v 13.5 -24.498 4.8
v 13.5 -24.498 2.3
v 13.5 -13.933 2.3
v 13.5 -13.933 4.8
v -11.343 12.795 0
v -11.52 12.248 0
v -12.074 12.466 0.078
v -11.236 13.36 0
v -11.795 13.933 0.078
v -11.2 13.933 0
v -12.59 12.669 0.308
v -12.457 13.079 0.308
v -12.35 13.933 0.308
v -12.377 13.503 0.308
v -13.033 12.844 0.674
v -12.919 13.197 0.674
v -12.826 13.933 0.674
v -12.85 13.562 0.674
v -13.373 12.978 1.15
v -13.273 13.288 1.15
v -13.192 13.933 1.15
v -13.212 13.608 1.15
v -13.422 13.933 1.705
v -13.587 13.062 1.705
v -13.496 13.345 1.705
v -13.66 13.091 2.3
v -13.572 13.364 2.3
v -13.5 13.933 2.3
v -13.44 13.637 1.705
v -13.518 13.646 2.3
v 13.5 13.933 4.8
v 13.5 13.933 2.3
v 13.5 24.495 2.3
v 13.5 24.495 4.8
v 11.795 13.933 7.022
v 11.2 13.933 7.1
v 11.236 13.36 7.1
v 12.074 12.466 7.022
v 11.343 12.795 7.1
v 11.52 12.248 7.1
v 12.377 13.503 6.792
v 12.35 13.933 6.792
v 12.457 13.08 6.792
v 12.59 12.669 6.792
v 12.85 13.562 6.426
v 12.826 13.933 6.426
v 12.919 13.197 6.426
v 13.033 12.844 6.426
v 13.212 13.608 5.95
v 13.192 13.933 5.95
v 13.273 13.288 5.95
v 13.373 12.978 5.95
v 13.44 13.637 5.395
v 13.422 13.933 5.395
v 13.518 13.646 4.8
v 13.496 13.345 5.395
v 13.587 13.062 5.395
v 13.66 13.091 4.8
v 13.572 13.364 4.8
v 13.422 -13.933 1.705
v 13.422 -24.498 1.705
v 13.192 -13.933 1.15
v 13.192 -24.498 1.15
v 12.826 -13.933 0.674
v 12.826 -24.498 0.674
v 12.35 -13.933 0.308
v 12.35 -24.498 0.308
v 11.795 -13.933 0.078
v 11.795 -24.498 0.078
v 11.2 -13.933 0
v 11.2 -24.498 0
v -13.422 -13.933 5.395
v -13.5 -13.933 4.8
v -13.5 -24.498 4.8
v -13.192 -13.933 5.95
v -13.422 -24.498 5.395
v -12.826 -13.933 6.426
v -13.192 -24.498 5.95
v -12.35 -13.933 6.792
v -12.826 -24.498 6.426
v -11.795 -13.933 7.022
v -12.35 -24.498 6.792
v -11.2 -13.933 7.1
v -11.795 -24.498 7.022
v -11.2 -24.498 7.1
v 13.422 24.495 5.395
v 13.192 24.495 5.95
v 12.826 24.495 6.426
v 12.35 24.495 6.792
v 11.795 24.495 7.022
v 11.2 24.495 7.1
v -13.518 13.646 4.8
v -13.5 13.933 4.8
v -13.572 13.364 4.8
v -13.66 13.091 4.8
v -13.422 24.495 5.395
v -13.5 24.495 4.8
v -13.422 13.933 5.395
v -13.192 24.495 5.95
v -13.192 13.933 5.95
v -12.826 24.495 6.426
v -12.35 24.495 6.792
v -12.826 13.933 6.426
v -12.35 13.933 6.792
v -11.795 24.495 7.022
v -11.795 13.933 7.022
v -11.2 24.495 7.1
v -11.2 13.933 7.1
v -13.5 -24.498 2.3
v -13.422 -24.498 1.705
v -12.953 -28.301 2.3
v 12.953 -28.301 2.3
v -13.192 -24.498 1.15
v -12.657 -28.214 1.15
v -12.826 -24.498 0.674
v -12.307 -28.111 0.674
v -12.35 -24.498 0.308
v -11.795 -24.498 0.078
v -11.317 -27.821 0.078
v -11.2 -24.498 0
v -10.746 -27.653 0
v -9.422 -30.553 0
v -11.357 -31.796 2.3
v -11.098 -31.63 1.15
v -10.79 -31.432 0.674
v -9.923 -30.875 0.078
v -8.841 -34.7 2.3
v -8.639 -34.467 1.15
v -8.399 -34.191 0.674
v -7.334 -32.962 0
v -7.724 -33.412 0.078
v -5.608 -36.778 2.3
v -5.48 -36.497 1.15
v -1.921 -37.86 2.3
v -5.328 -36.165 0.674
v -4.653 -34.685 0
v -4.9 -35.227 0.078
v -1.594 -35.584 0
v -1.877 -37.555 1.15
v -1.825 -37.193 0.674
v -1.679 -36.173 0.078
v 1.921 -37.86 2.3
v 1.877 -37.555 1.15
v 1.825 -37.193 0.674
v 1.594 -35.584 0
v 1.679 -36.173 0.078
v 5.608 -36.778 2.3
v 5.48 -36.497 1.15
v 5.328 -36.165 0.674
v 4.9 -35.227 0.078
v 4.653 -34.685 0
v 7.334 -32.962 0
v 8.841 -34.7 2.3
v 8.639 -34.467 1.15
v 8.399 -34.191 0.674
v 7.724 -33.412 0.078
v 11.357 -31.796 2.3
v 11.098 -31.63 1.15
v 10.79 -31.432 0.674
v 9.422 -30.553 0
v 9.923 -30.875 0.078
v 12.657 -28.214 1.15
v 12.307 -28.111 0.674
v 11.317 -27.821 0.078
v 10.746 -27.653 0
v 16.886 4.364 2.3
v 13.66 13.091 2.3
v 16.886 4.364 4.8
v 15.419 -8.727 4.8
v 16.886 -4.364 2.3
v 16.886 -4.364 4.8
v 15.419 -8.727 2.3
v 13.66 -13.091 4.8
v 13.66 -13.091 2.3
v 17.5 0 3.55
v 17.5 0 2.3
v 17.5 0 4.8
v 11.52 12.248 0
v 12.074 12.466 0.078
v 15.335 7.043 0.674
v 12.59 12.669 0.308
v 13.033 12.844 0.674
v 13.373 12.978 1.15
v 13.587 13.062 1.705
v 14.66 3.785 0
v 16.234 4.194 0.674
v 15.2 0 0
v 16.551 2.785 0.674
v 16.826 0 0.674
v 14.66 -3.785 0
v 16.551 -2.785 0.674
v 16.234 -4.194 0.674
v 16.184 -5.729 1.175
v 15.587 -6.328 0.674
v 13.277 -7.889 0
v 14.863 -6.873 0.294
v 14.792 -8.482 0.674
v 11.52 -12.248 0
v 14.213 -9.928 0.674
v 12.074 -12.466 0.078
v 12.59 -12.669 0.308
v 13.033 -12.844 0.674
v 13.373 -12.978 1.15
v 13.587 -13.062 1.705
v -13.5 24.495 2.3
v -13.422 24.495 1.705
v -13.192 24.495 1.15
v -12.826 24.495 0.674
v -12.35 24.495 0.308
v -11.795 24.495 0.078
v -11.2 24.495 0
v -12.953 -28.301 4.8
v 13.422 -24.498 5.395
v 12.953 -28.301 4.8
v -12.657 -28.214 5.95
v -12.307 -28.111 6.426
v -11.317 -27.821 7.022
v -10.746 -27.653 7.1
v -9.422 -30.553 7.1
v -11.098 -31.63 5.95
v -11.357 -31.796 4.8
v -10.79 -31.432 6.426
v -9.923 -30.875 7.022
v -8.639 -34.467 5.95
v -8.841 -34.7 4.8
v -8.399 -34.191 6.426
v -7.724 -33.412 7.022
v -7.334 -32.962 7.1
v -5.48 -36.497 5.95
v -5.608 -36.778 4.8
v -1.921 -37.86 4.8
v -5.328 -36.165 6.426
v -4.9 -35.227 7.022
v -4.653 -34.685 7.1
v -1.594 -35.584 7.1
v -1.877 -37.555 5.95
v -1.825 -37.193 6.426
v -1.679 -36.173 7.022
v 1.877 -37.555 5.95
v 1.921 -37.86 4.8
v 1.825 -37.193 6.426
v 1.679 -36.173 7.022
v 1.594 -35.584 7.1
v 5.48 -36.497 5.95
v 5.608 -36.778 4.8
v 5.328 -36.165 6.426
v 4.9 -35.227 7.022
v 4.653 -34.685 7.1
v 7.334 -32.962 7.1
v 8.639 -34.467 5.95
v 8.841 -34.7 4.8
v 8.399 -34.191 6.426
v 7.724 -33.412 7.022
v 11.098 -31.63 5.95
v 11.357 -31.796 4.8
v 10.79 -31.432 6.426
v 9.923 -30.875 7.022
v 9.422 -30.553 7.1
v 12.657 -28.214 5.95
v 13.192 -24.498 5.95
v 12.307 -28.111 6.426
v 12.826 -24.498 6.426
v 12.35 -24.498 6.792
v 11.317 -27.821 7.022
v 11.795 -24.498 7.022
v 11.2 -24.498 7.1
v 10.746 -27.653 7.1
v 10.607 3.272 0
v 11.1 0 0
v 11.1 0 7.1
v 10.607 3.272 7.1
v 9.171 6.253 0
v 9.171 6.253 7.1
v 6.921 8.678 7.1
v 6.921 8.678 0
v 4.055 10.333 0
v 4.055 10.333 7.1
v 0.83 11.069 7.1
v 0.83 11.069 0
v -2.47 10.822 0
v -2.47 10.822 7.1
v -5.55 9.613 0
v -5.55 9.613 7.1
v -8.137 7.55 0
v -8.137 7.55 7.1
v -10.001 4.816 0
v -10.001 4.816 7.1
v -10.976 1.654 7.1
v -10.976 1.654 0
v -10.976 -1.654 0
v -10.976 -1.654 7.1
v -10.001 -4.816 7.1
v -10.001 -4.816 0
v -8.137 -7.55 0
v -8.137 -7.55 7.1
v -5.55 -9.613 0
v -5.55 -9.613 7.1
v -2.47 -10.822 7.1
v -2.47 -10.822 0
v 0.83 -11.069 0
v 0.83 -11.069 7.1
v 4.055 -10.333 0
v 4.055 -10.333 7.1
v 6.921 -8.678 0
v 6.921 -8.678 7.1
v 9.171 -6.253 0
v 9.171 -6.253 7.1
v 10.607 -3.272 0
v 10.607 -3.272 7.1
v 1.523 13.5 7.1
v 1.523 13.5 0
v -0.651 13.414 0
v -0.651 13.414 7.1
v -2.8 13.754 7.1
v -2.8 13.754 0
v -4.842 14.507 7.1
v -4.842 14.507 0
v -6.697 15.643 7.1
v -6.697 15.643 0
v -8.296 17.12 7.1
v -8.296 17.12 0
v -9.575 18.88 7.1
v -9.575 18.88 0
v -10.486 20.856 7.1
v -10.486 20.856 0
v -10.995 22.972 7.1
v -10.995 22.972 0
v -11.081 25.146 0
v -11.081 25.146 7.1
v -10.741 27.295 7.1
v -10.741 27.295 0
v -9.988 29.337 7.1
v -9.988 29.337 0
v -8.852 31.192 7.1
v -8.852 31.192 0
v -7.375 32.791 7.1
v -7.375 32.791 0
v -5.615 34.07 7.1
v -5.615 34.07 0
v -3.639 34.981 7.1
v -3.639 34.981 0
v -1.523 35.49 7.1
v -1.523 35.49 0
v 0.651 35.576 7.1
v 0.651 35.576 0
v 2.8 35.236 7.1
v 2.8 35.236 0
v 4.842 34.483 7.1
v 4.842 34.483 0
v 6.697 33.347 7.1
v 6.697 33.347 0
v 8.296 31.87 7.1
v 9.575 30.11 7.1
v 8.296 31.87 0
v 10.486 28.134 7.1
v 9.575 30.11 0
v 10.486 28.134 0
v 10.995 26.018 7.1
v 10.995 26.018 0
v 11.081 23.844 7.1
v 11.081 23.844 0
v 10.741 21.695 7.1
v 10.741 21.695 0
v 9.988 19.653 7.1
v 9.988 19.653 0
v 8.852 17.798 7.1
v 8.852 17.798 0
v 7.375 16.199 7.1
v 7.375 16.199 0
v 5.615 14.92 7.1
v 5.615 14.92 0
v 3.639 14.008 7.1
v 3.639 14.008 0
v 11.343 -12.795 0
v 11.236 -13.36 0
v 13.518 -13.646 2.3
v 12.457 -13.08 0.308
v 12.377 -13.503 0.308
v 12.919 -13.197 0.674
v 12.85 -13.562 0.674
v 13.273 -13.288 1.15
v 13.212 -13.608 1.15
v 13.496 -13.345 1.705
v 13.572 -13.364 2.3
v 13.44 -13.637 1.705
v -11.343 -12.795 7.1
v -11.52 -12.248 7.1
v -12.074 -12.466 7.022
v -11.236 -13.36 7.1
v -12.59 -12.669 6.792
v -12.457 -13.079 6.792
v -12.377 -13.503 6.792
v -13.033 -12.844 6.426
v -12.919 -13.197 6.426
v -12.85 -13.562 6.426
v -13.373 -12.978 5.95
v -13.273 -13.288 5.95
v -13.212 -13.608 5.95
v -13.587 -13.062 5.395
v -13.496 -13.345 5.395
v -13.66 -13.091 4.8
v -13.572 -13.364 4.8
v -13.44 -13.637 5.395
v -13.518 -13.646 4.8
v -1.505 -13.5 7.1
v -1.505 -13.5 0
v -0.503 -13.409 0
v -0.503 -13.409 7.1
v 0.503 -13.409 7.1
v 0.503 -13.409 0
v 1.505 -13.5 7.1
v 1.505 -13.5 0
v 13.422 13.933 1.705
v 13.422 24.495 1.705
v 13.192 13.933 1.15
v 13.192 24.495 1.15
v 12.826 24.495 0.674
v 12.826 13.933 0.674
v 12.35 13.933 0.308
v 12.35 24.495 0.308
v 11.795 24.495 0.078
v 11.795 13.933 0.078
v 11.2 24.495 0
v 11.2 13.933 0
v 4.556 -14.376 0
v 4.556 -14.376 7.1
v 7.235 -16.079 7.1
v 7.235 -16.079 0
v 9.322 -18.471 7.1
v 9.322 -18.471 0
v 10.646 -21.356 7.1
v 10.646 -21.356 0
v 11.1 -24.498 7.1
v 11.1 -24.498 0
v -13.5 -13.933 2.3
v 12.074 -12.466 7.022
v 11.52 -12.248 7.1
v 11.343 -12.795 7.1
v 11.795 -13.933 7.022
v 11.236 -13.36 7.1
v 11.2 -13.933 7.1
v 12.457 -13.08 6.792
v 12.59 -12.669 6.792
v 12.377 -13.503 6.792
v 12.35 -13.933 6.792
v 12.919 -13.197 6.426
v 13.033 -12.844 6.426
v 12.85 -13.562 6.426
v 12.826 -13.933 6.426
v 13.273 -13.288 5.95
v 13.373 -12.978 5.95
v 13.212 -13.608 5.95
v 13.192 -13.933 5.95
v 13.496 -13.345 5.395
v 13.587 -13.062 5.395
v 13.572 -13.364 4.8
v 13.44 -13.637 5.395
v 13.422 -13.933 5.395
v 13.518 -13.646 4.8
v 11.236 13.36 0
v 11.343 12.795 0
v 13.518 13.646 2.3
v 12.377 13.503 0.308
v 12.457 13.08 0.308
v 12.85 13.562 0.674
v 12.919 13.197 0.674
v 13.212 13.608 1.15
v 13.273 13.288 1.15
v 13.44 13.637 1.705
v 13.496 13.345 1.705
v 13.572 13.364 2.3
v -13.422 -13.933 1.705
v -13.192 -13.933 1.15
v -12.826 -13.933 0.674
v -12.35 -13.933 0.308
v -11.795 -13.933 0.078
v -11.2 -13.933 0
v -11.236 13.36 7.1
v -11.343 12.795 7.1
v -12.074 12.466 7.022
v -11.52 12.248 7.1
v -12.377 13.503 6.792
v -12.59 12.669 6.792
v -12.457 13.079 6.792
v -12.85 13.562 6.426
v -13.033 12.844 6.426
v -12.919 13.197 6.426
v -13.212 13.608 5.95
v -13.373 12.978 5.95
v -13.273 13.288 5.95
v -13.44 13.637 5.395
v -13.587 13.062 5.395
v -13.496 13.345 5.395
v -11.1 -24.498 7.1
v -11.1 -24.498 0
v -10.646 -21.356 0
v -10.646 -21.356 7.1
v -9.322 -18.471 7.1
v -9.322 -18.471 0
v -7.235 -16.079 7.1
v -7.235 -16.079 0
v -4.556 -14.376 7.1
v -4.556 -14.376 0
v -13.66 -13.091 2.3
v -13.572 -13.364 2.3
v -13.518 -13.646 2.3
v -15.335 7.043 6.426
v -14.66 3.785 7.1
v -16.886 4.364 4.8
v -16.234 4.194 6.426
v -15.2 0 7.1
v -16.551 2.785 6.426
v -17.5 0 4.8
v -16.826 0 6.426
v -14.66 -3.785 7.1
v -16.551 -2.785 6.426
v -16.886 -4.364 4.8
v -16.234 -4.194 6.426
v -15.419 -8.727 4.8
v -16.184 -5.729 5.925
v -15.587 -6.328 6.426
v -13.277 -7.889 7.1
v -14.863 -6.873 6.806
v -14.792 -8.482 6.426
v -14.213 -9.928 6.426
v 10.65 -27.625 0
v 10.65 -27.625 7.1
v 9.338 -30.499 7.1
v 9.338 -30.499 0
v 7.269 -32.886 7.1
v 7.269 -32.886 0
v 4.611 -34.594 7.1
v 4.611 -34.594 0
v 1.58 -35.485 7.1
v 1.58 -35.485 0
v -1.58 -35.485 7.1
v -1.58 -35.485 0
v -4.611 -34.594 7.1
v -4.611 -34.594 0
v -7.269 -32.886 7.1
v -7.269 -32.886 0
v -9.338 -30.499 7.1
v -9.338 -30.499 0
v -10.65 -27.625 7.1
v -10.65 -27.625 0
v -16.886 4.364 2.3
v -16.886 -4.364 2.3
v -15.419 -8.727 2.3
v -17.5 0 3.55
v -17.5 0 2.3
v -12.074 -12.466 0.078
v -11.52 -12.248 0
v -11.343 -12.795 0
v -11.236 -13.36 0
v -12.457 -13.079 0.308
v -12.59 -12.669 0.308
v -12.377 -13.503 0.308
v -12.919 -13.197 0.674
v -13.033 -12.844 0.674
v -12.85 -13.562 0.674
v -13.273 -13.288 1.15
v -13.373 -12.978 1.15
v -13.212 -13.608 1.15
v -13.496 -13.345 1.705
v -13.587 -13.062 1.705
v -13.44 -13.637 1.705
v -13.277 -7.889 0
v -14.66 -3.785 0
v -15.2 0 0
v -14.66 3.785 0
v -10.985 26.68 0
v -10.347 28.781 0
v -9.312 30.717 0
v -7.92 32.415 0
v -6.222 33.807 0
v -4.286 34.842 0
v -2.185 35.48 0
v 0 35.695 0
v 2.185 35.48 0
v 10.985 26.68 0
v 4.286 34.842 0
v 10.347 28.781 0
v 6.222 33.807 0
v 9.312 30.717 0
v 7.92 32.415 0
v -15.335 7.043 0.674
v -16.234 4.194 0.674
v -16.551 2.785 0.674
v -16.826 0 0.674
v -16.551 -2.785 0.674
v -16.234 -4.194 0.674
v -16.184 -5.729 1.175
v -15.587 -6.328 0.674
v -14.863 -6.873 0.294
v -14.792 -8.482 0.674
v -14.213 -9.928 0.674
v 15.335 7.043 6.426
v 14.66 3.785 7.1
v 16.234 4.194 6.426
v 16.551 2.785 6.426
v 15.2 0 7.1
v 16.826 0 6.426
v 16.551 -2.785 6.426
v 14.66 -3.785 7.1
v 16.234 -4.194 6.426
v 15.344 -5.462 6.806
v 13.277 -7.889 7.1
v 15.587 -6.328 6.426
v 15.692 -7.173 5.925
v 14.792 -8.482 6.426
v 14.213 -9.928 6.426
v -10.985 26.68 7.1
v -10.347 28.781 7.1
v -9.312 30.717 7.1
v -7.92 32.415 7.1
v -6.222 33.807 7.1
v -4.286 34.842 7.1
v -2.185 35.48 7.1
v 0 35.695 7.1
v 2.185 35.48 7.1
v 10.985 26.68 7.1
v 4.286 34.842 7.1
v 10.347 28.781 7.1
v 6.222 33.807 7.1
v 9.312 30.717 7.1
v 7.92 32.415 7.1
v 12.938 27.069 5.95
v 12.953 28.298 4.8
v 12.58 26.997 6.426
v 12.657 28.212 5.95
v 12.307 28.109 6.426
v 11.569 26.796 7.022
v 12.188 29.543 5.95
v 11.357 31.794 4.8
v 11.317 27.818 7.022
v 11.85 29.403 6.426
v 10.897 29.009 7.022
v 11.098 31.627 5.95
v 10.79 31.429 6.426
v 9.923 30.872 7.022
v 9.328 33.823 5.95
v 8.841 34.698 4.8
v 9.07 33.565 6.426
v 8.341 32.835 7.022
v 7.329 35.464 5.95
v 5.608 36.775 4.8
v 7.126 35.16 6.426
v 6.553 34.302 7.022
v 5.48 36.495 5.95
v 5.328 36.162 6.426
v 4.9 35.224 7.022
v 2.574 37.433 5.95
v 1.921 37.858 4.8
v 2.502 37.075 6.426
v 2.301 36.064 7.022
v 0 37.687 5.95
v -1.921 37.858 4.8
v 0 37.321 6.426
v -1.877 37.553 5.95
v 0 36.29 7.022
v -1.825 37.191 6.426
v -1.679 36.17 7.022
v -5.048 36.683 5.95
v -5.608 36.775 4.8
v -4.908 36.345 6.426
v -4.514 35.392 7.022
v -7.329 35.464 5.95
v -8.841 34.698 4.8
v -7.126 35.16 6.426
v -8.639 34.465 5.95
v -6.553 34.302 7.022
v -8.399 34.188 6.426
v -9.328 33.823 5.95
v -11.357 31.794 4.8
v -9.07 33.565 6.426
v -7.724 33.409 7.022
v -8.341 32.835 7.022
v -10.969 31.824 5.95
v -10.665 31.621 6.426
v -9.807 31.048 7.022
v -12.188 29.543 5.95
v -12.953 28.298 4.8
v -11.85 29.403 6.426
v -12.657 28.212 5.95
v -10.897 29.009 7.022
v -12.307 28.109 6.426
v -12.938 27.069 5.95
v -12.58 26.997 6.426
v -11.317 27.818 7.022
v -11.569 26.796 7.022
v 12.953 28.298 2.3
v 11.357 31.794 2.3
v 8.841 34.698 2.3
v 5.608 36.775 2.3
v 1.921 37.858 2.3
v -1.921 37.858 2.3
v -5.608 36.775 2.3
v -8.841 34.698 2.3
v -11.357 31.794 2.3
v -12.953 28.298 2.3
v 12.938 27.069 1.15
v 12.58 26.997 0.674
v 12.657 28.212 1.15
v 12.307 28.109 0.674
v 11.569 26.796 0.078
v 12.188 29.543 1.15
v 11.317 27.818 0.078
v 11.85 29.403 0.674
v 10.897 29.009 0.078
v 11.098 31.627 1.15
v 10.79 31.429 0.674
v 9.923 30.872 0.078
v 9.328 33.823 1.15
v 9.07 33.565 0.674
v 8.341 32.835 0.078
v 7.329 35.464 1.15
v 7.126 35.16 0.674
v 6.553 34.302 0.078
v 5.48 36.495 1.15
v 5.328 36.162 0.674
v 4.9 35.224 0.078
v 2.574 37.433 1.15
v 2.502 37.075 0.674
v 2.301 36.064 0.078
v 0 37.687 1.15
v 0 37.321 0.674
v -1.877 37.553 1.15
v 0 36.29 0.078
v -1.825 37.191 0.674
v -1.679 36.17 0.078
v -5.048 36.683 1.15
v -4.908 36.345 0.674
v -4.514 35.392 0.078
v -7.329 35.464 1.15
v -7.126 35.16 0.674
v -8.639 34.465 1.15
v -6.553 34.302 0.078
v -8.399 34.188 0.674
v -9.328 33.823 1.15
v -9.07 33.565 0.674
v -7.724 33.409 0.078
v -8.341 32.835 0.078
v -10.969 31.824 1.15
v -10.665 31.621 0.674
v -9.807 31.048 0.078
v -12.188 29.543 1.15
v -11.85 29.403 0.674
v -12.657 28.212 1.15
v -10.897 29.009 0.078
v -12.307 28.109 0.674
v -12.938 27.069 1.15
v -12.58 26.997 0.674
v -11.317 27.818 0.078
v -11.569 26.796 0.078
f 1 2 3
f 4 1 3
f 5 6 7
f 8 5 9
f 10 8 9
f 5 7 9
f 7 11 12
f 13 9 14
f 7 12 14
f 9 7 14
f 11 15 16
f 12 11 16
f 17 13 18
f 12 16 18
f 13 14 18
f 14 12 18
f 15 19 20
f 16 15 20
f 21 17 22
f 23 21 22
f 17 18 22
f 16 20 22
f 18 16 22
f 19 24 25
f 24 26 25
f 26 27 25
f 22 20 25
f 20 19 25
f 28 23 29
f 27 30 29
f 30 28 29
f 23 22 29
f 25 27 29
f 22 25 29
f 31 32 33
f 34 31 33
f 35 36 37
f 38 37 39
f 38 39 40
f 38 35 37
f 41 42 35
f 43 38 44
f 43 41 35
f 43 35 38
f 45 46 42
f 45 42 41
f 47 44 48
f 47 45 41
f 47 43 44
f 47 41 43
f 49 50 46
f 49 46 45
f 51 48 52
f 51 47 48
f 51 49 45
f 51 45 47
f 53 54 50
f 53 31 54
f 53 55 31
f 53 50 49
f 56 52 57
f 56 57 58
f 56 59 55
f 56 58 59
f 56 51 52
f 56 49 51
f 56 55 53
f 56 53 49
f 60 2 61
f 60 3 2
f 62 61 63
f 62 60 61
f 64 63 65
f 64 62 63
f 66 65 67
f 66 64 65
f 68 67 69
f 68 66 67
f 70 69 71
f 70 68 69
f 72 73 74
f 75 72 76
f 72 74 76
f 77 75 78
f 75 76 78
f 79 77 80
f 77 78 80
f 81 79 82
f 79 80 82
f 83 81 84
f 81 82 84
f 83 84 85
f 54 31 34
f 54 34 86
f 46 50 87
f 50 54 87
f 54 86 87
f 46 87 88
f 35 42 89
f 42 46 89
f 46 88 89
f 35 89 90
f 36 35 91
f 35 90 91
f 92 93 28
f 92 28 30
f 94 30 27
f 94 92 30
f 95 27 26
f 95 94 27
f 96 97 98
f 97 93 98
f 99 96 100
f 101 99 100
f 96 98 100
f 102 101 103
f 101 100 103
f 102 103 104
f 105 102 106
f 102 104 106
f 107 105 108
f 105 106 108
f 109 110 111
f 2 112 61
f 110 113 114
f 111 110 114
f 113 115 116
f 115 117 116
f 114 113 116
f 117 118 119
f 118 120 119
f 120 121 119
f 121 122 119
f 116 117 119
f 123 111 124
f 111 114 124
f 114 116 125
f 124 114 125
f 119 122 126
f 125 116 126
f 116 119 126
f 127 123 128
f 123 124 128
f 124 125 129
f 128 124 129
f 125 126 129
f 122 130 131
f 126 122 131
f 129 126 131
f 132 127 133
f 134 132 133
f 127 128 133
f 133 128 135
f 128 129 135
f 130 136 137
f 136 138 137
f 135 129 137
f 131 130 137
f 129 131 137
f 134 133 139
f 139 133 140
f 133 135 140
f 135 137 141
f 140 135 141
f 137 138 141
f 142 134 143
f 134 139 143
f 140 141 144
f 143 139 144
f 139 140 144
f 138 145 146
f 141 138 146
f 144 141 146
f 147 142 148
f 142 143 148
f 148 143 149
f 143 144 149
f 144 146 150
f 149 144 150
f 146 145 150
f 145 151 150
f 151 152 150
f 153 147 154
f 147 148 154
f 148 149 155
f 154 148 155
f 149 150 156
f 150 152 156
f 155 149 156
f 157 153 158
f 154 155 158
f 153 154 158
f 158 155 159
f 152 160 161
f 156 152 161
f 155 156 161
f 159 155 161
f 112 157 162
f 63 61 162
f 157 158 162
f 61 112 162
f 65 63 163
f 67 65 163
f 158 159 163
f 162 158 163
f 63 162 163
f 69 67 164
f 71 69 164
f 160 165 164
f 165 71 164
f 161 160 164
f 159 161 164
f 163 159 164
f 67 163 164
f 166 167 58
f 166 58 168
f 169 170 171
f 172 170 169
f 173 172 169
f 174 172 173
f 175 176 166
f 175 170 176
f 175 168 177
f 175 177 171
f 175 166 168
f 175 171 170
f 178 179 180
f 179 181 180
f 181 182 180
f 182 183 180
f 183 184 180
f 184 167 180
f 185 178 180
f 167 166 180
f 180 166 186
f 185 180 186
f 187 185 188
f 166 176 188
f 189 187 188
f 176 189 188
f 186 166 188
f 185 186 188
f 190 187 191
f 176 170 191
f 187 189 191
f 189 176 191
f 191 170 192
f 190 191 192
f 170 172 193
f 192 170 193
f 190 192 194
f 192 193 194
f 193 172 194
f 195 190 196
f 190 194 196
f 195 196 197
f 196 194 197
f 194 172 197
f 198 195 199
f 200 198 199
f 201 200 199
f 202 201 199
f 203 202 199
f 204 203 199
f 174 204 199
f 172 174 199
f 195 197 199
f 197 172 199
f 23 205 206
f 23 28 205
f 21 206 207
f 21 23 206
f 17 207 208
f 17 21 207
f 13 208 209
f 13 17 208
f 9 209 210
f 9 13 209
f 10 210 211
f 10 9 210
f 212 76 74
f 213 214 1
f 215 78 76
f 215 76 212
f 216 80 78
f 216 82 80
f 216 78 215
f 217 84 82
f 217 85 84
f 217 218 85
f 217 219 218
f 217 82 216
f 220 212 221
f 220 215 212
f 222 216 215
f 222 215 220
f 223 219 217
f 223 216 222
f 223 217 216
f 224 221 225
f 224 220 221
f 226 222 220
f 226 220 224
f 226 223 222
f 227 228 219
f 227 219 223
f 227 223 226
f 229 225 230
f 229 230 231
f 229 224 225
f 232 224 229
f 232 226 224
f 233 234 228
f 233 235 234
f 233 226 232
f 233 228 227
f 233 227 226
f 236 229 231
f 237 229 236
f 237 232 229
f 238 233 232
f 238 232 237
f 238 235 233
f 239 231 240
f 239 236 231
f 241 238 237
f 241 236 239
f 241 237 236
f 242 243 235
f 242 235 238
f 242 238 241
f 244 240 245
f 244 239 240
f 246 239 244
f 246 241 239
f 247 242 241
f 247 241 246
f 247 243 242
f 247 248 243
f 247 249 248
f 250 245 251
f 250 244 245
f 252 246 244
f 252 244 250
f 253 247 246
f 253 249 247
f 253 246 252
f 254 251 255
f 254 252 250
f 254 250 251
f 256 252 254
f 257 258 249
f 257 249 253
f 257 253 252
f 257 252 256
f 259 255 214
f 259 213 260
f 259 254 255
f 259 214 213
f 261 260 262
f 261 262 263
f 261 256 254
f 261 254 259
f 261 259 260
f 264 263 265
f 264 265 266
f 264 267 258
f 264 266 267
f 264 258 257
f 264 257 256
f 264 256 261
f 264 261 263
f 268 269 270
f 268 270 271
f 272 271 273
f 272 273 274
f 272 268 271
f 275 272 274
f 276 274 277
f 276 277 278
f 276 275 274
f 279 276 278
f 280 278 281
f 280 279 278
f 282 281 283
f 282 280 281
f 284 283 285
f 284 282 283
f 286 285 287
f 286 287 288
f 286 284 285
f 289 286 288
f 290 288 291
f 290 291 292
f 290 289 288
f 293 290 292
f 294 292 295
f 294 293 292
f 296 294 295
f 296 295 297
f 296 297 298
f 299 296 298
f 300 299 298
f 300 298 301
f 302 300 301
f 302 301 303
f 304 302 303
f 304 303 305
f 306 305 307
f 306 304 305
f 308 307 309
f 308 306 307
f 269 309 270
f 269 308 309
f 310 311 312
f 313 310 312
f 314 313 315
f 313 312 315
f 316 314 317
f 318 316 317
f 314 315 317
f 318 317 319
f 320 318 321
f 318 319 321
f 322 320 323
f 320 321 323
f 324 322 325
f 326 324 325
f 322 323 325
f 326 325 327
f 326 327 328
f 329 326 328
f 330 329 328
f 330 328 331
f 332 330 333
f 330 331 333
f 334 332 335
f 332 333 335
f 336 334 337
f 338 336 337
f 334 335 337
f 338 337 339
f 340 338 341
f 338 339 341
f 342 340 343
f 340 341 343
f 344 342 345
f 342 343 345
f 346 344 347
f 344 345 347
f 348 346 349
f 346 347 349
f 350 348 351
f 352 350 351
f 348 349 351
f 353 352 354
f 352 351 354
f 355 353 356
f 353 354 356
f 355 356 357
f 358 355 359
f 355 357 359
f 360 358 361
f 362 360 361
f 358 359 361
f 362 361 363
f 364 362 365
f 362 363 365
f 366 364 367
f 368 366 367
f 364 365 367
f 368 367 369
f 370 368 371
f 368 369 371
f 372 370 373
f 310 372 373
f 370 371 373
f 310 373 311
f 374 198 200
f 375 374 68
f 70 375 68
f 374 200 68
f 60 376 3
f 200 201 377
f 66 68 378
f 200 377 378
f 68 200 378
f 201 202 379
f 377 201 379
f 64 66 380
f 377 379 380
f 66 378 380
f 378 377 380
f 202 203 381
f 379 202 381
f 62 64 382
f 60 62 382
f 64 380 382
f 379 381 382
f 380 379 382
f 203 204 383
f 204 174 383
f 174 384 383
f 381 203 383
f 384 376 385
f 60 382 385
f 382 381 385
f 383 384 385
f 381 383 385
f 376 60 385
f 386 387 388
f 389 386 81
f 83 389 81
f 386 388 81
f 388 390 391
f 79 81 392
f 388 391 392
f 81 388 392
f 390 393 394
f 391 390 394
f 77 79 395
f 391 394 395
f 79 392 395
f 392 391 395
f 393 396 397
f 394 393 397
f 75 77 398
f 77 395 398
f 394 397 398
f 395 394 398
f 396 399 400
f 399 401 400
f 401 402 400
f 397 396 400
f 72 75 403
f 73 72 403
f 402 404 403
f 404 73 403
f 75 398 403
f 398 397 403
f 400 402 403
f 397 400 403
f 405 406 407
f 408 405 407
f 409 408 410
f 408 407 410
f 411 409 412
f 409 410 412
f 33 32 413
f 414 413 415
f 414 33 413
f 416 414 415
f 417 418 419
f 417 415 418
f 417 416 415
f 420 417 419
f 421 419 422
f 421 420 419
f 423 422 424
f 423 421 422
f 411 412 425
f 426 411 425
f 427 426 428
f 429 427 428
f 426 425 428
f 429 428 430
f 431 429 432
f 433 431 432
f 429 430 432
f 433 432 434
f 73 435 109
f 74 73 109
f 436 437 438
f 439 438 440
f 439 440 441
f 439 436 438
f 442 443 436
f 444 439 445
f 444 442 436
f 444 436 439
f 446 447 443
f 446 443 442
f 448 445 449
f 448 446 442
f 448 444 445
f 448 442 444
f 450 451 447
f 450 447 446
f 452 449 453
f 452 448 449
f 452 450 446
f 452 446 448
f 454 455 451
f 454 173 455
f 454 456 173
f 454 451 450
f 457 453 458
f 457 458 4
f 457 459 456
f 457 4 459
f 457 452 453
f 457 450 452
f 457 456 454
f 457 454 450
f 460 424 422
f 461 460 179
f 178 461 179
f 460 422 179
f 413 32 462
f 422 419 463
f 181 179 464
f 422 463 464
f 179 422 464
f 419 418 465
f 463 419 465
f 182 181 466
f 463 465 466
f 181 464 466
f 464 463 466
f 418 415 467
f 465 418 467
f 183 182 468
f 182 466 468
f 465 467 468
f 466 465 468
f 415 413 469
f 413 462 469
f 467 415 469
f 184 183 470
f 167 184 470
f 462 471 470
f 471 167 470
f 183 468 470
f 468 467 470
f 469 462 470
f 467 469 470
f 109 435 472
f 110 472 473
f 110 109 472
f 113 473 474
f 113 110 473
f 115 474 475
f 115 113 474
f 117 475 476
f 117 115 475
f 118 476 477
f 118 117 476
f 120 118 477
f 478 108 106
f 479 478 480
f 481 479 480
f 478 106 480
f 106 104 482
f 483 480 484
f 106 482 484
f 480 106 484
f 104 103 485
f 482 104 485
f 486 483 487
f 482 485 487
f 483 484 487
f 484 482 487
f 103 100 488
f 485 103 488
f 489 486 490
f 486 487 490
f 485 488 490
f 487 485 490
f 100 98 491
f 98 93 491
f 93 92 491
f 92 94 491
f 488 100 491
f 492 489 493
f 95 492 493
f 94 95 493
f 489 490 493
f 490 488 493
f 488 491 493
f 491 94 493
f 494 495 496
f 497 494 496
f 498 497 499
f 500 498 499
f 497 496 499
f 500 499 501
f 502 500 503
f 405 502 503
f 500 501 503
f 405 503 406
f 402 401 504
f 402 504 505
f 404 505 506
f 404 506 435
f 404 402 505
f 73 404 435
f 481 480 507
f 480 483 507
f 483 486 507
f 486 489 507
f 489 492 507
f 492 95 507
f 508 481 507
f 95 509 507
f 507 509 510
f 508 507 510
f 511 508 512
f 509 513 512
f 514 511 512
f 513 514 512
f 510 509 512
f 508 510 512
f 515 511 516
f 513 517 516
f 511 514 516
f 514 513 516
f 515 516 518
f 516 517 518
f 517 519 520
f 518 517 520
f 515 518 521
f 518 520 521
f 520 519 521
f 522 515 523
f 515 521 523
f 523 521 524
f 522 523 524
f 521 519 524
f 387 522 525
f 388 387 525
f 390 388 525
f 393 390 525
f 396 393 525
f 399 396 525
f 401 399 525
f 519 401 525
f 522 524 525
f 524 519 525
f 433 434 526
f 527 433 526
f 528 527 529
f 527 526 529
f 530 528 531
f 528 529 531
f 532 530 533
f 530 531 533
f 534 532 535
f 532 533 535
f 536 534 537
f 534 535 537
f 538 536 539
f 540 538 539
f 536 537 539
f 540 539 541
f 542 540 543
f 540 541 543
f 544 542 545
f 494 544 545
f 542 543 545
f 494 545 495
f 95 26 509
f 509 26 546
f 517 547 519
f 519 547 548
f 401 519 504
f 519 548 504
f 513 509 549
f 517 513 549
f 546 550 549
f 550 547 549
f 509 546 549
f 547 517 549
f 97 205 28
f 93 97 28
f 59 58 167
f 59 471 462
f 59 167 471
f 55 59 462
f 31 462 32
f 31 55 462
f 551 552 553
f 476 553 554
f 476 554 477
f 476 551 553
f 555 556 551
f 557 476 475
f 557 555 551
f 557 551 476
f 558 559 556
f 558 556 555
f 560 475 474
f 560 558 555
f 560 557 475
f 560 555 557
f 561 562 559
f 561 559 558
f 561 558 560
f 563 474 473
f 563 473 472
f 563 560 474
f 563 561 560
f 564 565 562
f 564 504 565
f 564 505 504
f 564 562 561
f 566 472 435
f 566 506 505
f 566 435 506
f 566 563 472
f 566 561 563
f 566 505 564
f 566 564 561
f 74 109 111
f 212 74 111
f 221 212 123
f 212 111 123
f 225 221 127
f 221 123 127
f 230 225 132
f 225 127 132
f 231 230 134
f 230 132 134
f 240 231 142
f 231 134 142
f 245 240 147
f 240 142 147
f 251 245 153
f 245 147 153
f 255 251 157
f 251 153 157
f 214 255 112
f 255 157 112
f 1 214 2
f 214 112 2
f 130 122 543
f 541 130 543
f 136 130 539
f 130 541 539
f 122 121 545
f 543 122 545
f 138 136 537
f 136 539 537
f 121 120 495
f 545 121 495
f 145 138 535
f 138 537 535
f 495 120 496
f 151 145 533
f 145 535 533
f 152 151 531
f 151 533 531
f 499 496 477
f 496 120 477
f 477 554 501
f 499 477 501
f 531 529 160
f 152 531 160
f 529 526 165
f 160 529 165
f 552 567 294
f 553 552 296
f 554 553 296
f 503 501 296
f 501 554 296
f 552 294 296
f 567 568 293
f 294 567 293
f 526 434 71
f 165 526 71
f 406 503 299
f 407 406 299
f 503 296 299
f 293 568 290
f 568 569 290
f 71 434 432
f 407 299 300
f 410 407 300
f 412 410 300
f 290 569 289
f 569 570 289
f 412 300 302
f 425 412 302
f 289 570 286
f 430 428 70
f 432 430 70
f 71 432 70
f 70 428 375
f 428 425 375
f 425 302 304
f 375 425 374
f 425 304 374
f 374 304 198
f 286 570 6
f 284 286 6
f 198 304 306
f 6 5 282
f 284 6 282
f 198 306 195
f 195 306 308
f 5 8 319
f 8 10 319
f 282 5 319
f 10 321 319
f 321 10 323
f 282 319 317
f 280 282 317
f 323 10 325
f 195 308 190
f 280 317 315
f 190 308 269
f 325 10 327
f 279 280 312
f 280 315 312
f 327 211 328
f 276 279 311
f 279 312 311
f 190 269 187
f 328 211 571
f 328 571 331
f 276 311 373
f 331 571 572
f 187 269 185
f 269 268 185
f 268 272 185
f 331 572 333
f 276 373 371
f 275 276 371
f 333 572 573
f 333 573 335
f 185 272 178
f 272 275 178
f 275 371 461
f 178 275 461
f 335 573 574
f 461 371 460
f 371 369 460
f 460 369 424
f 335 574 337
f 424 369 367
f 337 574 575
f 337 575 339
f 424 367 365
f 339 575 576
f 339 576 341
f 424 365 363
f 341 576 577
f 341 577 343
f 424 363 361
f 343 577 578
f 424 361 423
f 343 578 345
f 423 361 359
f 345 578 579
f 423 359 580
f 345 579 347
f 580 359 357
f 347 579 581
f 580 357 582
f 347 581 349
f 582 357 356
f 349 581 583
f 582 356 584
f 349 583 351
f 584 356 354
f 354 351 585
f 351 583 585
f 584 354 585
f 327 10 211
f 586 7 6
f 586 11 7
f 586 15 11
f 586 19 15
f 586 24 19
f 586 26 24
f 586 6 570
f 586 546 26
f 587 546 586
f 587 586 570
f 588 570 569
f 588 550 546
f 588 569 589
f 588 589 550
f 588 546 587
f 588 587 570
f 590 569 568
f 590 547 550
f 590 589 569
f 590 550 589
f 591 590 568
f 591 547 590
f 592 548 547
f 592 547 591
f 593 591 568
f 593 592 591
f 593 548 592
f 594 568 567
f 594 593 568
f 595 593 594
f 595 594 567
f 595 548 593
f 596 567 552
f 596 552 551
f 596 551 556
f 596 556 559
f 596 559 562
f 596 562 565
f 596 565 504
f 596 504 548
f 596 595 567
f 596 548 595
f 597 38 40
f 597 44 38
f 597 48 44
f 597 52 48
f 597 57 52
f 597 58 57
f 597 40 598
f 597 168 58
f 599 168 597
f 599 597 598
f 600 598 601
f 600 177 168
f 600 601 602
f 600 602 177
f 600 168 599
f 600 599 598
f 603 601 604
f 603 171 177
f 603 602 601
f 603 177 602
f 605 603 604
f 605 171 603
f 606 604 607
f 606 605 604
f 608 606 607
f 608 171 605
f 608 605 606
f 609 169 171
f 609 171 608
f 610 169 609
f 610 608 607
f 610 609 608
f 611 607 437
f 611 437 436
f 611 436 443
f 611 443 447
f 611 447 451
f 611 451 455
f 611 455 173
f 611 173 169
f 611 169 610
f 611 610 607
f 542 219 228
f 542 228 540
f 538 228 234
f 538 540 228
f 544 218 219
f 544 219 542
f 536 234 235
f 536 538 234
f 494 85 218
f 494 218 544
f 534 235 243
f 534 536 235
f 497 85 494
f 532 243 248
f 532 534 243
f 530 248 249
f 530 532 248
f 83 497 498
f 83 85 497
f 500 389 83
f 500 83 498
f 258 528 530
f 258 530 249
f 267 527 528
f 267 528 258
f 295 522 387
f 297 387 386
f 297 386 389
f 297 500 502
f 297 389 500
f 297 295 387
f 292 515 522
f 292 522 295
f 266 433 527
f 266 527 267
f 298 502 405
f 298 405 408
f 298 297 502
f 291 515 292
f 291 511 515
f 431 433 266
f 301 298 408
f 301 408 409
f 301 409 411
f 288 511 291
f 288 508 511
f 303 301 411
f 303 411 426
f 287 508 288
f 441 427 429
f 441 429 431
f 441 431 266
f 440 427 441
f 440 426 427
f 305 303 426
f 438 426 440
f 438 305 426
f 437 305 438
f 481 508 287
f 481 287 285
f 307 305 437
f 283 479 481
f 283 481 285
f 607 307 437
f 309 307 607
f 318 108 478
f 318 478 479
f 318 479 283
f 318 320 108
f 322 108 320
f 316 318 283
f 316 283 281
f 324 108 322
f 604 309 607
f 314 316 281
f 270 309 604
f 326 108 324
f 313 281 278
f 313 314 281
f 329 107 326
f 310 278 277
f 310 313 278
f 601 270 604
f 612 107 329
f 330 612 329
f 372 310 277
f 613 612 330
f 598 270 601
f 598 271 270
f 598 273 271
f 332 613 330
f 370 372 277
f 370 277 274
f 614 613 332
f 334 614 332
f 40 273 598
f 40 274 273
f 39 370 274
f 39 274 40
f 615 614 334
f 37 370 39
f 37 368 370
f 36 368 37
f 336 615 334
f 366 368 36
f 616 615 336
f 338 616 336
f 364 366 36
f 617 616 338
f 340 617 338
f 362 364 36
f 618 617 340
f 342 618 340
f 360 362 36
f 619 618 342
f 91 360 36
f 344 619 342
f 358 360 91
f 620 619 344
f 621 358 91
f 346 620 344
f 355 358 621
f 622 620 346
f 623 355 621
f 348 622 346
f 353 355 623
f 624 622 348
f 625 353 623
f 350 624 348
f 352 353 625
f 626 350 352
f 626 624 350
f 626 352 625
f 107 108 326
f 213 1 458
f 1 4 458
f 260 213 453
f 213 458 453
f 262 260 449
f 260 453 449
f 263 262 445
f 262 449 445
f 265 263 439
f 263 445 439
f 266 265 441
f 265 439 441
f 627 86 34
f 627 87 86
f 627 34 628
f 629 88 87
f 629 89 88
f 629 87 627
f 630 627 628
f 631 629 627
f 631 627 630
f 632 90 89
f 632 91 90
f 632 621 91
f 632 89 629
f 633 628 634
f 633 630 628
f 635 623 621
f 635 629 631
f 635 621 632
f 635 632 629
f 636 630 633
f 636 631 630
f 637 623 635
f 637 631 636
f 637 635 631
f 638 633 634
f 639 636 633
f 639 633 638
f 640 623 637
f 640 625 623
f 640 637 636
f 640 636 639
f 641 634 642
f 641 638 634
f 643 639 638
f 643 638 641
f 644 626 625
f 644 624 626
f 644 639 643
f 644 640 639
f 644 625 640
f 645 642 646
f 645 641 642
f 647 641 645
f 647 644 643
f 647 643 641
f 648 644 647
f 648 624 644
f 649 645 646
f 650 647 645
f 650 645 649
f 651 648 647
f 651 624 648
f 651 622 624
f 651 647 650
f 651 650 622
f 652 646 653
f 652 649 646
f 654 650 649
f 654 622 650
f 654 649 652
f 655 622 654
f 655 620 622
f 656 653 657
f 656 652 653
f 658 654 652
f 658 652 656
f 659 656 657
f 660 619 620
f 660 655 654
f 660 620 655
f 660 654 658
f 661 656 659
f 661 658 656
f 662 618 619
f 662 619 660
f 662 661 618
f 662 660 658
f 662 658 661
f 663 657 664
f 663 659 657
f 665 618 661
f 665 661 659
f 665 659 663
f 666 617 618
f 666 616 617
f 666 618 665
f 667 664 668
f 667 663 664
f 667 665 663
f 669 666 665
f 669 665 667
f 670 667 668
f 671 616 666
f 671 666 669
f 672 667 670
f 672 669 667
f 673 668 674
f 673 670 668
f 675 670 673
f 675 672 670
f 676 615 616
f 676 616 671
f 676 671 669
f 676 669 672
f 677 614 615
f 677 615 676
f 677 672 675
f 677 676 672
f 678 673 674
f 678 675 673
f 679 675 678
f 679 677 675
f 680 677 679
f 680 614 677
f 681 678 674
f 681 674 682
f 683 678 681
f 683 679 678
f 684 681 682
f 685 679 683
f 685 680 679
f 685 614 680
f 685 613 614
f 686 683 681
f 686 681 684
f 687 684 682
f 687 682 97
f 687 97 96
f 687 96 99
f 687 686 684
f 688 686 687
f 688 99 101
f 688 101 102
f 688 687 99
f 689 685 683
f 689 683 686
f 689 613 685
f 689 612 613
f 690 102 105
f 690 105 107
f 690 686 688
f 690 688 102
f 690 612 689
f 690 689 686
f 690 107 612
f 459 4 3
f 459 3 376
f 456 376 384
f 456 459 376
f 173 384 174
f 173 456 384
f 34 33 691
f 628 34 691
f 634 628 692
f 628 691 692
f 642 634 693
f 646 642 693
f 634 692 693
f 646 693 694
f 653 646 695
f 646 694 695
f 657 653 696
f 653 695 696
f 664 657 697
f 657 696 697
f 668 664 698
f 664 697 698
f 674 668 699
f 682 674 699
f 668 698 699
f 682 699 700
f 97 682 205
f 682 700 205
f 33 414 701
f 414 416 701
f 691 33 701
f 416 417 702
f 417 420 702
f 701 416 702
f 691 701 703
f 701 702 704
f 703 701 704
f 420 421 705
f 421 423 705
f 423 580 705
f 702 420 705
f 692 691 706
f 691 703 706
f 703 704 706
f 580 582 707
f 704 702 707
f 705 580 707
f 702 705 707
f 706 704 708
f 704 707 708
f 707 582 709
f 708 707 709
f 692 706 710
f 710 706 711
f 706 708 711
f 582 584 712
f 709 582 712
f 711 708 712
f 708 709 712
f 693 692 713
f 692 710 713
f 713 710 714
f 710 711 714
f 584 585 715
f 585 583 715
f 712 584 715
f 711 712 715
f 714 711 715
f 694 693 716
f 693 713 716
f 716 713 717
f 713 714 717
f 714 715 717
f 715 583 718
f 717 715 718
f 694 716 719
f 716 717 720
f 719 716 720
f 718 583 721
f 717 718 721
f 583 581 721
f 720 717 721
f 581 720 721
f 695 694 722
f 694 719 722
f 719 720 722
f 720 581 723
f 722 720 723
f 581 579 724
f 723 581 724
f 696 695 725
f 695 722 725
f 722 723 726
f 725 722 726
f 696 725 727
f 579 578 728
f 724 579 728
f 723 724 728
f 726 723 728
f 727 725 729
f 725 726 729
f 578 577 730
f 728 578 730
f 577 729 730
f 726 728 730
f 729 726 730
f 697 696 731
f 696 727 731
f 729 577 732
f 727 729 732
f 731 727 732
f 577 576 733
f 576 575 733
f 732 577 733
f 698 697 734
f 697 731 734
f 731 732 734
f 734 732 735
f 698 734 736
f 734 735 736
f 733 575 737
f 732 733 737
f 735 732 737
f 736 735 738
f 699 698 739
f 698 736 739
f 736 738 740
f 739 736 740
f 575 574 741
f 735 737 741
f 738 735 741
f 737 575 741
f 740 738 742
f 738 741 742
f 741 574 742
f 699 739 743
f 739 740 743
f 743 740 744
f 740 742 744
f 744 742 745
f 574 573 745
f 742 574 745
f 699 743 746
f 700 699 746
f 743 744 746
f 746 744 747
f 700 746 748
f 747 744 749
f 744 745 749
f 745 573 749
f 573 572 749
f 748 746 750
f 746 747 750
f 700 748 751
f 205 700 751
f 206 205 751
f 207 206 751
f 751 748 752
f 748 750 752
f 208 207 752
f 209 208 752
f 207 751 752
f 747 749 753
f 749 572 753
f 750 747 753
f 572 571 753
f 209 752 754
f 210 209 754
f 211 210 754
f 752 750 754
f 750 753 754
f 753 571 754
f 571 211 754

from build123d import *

# Parameters (mm, degrees)
F0_R     = 11.1
F1_DEPTH = 7.1
F2_R     = 2.3


with BuildPart() as f1:
    # F0 (on Top) → F1 (new body)
    with BuildSketch(Plane.XY):
        with BuildLine():
            Line((11.1, 24.4949632536), (13.5, 24.4949632536))
            ThreePointArc((13.5, 24.4949632536), (0, 37.9949632536), (-13.5, 24.4949632536))
            Line((-13.5, 24.4949632536), (-11.1, 24.4949632536))
            ThreePointArc((-11.1, 24.4949632536), (0, 35.5949632536), (11.1, 24.4949632536))
        make_face()
        with BuildLine():
            Line((-13.5, 13.5), (-1.5234116489, 13.5))
            ThreePointArc((-1.5234116489, 13.5), (-8.3701812795, 17.2045541191), (-11.1, 24.4949632536))
            Line((-11.1, 24.4949632536), (-13.5, 24.4949632536))
            Line((-13.5, 24.4949632536), (-13.5, 13.5))
        make_face()
        with BuildLine():
            Line((1.5234116489, 13.5), (13.5, 13.5))
            Line((13.5, 13.5), (13.5, 24.4949632536))
            Line((13.5, 24.4949632536), (11.1, 24.4949632536))
            ThreePointArc((11.1, 24.4949632536), (8.3701812795, 17.2045541191), (1.5234116489, 13.5))
        make_face()
        with BuildLine():
            Line((13.5, -13.5), (13.5, 13.5))
            Line((13.5, 13.5), (1.5234116489, 13.5))
            ThreePointArc((1.5234116489, 13.5), (0, 13.3949632536), (-1.5234116489, 13.5))
            Line((-1.5234116489, 13.5), (-13.5, 13.5))
            Line((-13.5, 13.5), (-13.5, -13.5))
            Line((-13.5, -13.5), (-1.5048250316, -13.5))
            ThreePointArc((-1.5048250316, -13.5), (0, -13.3975225221), (1.5048250316, -13.5))
            Line((1.5048250316, -13.5), (13.5, -13.5))
        make_face()
        Circle(F0_R, mode=Mode.SUBTRACT)
        with BuildLine():
            add(Edge.make_bspline(
                [(13.5, 13.5), (15.2430341691, 9), (19.7569658309, 0), (15.2430341691, -9), (13.5, -13.5)],
                knots=[0, 0, 0, 0, 0.5, 1, 1, 1, 1], degree=3))
            Line((13.5, 13.5), (13.5, -13.5))
        make_face()
        with BuildLine():
            Line((-13.5, -13.5), (-13.5, 13.5))
            add(Edge.make_bspline(
                [(-13.5, 13.5), (-15.2435445338, 9), (-19.7564554662, 0), (-15.2435445338, -9), (-13.5, -13.5)],
                knots=[0, 0, 0, 0, 0.5, 1, 1, 1, 1], degree=3))
        make_face()
        with BuildLine():
            ThreePointArc((-11.1, -24.4975225221), (-8.3640169133, -17.2000420614), (-1.5048250316, -13.5))
            Line((-1.5048250316, -13.5), (-13.5, -13.5))
            Line((-13.5, -13.5), (-13.5, -24.4975225221))
            Line((-13.5, -24.4975225221), (-11.1, -24.4975225221))
        make_face()
        with BuildLine():
            Line((13.5, -24.4975225221), (13.5, -13.5))
            Line((13.5, -13.5), (1.5048250316, -13.5))
            ThreePointArc((1.5048250316, -13.5), (8.3640169133, -17.2000420614), (11.1, -24.4975225221))
            Line((11.1, -24.4975225221), (13.5, -24.4975225221))
        make_face()
        with BuildLine():
            ThreePointArc((-13.5, -24.4975225221), (0, -37.9975225221), (13.5, -24.4975225221))
            Line((13.5, -24.4975225221), (11.1, -24.4975225221))
            ThreePointArc((11.1, -24.4975225221), (0, -35.5975225221), (-11.1, -24.4975225221))
            Line((-11.1, -24.4975225221), (-13.5, -24.4975225221))
        make_face()
    extrude(amount=F1_DEPTH)

    # F2
    f2_edges = [f1.edges().sort_by_distance(p)[0] for p in [
        (13.5, -13.5, 3.55),
        (17.5, 0, 7.1),
        (17.5, 0, 0),
        (13.5, 13.5, 3.55),
        (13.5, 18.997482, 7.1),
        (0, 37.994963, 7.1),
        (0, 37.994963, 0),
        (13.5, 24.494963, 3.55),
        (13.5, 18.997482, 0),
        (-13.5, 18.997482, 7.1),
        (-17.5, 0, 7.1),
        (0, -37.997523, 7.1),
        (-13.5, -18.998761, 7.1),
        (13.5, -18.998761, 7.1),
        (13.5, -18.998761, 0),
        (0, -37.997523, 0),
        (-13.5, -13.5, 3.55),
        (-13.5, 13.5, 3.55),
        (-13.5, 18.997482, 0),
        (-17.5, 0, 0),
        (-13.5, -18.998761, 0),
    ]]
    fillet(f2_edges, radius=F2_R)


solid = f1.part
